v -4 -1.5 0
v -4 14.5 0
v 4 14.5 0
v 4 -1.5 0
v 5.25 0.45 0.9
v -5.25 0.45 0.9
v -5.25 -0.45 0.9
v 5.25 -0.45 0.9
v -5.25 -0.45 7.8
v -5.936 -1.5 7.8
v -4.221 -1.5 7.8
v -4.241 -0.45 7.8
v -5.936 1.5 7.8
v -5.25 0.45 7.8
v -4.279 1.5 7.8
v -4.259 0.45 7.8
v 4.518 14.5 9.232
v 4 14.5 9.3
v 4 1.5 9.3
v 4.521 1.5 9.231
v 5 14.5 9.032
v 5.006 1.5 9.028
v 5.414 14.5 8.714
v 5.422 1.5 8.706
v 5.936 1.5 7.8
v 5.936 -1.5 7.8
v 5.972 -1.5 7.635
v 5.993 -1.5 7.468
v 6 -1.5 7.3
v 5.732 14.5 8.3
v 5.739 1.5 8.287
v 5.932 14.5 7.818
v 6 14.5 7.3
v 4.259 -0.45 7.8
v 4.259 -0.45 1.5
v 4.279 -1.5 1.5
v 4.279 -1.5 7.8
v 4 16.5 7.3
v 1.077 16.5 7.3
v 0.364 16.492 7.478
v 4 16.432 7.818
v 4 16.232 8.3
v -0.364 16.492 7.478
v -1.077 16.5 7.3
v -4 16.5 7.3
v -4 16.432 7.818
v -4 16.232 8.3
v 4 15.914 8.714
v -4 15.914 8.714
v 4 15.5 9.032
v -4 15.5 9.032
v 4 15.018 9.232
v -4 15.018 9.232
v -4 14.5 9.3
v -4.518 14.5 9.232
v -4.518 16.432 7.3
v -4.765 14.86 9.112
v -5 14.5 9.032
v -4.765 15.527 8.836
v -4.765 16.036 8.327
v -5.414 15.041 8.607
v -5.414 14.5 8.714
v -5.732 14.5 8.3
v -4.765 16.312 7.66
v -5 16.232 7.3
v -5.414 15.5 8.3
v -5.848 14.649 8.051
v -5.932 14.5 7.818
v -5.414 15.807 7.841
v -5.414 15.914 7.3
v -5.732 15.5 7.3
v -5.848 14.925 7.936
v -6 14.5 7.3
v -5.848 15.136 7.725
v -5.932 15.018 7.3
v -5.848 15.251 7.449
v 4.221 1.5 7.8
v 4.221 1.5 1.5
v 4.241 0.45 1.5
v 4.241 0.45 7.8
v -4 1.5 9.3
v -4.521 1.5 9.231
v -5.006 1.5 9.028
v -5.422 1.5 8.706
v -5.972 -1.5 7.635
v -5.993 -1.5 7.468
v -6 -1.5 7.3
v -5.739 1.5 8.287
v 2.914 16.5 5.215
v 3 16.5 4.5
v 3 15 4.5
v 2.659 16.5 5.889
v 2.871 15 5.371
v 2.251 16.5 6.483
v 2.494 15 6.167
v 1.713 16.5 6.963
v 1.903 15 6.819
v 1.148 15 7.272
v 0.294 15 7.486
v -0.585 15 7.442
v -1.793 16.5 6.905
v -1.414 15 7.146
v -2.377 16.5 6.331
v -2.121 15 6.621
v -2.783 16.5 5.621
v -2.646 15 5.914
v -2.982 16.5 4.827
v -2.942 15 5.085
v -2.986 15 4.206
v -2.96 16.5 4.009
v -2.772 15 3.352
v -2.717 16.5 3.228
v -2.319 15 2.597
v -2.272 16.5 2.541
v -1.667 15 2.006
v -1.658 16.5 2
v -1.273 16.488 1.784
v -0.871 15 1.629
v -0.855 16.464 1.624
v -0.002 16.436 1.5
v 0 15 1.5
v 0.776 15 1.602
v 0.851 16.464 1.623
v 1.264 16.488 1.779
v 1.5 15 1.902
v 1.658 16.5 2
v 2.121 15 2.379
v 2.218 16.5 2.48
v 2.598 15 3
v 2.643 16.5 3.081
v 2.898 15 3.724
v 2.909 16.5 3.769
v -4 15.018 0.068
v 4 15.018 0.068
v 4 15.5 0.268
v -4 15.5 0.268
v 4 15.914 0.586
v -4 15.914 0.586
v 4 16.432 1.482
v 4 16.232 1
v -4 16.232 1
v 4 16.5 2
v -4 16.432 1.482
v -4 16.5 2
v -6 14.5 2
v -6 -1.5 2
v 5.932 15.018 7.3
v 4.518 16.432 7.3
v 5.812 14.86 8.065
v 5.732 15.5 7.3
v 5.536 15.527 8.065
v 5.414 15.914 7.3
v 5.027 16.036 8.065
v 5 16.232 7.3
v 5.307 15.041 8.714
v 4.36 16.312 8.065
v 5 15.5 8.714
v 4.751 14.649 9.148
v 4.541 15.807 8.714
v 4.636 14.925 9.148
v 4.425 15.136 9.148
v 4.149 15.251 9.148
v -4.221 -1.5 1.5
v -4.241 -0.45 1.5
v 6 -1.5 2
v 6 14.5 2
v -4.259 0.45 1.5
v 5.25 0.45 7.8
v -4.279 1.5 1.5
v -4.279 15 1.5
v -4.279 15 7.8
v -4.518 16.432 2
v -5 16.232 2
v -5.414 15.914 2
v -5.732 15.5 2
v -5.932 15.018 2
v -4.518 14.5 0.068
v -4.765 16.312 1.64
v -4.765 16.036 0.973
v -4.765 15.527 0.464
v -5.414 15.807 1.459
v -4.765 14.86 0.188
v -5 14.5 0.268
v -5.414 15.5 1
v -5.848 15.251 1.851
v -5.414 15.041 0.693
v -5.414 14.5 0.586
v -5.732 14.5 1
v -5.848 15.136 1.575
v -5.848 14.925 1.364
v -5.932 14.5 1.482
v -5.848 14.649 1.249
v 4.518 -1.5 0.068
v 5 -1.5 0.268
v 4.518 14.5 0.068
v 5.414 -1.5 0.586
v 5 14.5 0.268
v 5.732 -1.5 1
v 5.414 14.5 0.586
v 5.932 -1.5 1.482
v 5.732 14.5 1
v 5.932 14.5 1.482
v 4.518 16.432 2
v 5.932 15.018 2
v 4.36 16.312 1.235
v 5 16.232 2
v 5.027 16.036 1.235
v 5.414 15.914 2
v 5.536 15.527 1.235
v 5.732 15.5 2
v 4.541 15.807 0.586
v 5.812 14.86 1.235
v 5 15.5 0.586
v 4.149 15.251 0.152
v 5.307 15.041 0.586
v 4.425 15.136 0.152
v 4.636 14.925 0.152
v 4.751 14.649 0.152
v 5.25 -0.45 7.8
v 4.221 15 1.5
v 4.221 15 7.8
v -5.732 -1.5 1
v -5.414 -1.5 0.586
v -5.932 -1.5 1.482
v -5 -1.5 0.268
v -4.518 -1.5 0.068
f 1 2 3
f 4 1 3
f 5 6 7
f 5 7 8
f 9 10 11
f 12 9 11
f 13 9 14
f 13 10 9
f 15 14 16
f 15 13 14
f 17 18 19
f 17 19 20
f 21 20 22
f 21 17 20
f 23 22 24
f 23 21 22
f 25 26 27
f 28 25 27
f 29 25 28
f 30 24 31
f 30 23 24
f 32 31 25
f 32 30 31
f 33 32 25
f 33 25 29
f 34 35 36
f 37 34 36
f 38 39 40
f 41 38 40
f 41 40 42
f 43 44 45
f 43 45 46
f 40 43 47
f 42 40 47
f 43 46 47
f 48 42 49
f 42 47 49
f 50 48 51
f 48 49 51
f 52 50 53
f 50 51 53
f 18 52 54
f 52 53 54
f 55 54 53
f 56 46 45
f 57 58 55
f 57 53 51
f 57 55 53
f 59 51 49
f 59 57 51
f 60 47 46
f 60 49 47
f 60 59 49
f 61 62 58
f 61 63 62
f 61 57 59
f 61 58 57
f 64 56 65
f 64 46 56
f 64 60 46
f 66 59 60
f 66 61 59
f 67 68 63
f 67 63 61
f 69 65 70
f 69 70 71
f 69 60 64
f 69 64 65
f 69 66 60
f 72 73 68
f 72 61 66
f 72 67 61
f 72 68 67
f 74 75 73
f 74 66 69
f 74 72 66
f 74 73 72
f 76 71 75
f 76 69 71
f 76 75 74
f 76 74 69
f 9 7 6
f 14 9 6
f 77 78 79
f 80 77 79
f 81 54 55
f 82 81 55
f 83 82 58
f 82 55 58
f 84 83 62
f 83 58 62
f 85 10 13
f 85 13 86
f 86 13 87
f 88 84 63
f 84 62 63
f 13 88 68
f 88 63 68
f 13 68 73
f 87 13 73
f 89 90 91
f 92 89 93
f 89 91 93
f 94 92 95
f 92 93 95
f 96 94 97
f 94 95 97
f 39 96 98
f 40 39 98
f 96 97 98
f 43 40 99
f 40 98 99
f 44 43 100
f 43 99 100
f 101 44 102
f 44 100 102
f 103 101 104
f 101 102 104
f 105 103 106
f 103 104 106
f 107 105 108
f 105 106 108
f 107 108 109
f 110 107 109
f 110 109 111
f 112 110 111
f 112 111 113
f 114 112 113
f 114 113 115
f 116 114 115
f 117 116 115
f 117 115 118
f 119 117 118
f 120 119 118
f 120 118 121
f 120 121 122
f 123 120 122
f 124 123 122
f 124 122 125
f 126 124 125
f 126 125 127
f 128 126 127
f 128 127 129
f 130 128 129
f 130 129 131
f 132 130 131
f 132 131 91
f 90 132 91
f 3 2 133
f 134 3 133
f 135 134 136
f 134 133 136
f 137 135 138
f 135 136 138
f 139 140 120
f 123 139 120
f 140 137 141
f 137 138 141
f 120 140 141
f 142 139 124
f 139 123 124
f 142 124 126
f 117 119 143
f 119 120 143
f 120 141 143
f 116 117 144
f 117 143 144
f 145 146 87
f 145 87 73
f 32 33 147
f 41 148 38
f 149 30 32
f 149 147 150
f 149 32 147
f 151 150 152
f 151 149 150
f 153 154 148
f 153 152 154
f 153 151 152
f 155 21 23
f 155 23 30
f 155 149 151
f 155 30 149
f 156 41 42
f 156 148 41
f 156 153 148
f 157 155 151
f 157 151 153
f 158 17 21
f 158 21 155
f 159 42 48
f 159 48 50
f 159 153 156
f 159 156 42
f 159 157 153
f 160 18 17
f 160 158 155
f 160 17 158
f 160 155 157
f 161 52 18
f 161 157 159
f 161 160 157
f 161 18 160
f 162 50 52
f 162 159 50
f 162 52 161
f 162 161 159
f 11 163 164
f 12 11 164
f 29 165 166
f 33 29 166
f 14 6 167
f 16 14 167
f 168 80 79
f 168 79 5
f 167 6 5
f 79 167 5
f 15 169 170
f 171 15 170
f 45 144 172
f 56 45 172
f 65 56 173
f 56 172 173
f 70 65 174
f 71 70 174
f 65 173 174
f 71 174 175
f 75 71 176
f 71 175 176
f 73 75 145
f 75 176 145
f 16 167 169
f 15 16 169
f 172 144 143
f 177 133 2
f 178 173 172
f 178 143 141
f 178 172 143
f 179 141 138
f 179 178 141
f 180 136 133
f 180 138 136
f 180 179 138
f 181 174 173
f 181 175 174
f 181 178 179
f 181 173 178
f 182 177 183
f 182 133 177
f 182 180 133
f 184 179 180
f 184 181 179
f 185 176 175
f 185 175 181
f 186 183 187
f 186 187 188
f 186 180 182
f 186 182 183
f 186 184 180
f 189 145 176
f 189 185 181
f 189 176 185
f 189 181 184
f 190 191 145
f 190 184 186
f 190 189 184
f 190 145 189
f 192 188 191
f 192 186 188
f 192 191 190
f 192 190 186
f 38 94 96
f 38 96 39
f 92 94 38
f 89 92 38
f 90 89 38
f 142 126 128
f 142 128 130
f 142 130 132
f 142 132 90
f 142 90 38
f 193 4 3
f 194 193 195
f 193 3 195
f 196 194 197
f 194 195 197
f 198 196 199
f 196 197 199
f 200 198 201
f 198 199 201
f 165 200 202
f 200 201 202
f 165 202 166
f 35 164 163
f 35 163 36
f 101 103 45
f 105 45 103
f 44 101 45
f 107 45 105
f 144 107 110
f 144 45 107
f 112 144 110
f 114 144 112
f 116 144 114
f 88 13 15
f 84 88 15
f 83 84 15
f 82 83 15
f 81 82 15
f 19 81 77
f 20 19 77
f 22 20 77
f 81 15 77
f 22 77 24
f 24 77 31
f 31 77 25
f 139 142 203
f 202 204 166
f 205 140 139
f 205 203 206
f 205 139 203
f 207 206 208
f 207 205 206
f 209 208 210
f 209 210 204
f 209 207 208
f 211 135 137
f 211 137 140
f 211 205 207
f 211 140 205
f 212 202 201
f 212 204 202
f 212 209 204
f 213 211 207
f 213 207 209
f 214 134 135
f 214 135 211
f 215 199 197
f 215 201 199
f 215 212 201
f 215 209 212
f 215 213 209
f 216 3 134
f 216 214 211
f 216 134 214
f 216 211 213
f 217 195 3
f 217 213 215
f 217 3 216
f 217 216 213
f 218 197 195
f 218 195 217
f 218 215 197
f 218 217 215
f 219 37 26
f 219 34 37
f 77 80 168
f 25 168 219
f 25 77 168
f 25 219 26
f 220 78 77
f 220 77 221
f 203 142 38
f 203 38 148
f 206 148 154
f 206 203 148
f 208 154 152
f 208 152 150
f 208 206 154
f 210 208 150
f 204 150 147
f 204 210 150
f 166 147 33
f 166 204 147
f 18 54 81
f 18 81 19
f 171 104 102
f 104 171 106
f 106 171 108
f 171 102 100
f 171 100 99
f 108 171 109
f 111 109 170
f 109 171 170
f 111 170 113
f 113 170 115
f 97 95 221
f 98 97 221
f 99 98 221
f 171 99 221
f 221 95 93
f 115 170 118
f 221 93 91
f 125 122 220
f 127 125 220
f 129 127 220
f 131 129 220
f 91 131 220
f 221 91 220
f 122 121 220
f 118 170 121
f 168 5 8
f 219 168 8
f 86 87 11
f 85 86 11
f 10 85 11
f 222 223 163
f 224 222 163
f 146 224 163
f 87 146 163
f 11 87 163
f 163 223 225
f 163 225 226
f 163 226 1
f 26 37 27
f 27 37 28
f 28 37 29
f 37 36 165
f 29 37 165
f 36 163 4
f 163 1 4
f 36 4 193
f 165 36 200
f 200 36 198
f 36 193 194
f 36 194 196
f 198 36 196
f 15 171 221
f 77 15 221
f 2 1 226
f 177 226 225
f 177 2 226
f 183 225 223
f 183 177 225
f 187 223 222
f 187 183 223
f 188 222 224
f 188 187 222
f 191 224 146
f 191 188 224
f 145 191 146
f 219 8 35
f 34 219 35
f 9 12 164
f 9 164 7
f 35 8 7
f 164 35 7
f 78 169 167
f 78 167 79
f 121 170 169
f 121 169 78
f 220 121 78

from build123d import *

# Parameters (mm, degrees)
F0_W         = 8.5
F0_H         = 13.5
F0_W_2       = 1.7211329822
F0_H_2       = 1.5
F0_W_3       = 1.7788670178
F1_DEPTH     = 0.9
F2_DEPTH     = 1.5
F3_DEPTH     = 7.8
F5_W         = 12
F5_H         = 15
F6_DEPTH     = 1.5
F7_R         = 3
F8_DEPTH     = 16.501
F9_T1_DEPTH  = 5.3
F9_T3_DEPTH  = 8
F9_T5_DEPTH  = 18
F9_T7_DEPTH  = 21
F9_S11_W     = 2
F9_S11_H     = 2
F9_T12_DEPTH = 2
F9_S17_W     = 2
F9_S17_H     = 2
F9_T18_DEPTH = 2
F9_S23_W     = 2
F9_S23_H     = 2
F9_T24_DEPTH = 2
F9_S29_W     = 2
F9_S29_H     = 2
F9_T30_DEPTH = 2


# Not quite as in the source:
# - a fillet or chamfer that OpenCascade refuses, or shapes differently, is made with other operations: its cross-section is extruded or revolved along the edge and cut away or added
# - a feature names something its author has since deleted; it is built from what else it names


with BuildPart() as f1:
    # F0 (on Top) → F1 (new body)
    with BuildSketch(Plane.XY):
        with Locations((-0.0288670178, 8.25)):
            Rectangle(F0_W, F0_H)
        Polygon((-6, 1.5), (-6, -1.5), (-4.2211329822, -1.5), (-4.2413398946, -0.45), (-5.25, -0.45), (-5.25, 0.45), (-4.2586601054, 0.45), (-4.2788670178, 1.5), align=None)
        Polygon((4.2211329822, 1.5), (-4.2788670178, 1.5), (-4.2586601054, 0.45), (4.2413398946, 0.45), align=None)
        with Locations((-5.1394335089, 8.25)):
            Rectangle(F0_W_2, F0_H)
        Polygon((4.2586601054, -0.45), (4.2788670178, -1.5), (6, -1.5), (6, 1.5), (4.2211329822, 1.5), (4.2413398946, 0.45), (5.25, 0.45), (5.25, -0.45), align=None)
        Polygon((-4.2413398946, -0.45), (-4.2211329822, -1.5), (4.2788670178, -1.5), (4.2586601054, -0.45), align=None)
        Polygon((-4.2586601054, 0.45), (-4.2413398946, -0.45), (4.2586601054, -0.45), (4.2413398946, 0.45), align=None)
        Polygon((-5.25, -0.45), (-4.2413398946, -0.45), (-4.2586601054, 0.45), (-5.25, 0.45), align=None)
        Polygon((4.2413398946, 0.45), (4.2586601054, -0.45), (5.25, -0.45), (5.25, 0.45), align=None)
        with Locations((-5.1394335089, 15.75)):
            Rectangle(F0_W_2, F0_H_2)
        with Locations((-0.0288670178, 15.75)):
            Rectangle(F0_W, F0_H_2)
        with Locations((5.1105664911, 15.75)):
            Rectangle(F0_W_3, F0_H_2)
        with Locations((5.1105664911, 8.25)):
            Rectangle(F0_W_3, F0_H)
    extrude(amount=F1_DEPTH)

    # F0 (on Top) → F2 (join)
    with BuildSketch(Plane.XY):
        Polygon((-4.2413398946, -0.45), (-4.2211329822, -1.5), (4.2788670178, -1.5), (4.2586601054, -0.45), align=None)
        Polygon((-6, 1.5), (-6, -1.5), (-4.2211329822, -1.5), (-4.2413398946, -0.45), (-5.25, -0.45), (-5.25, 0.45), (-4.2586601054, 0.45), (-4.2788670178, 1.5), align=None)
        Polygon((4.2586601054, -0.45), (4.2788670178, -1.5), (6, -1.5), (6, 1.5), (4.2211329822, 1.5), (4.2413398946, 0.45), (5.25, 0.45), (5.25, -0.45), align=None)
        Polygon((4.2211329822, 1.5), (-4.2788670178, 1.5), (-4.2586601054, 0.45), (4.2413398946, 0.45), align=None)
        with Locations((-5.1394335089, 8.25)):
            Rectangle(F0_W_2, F0_H)
        with Locations((5.1105664911, 8.25)):
            Rectangle(F0_W_3, F0_H)
        with Locations((-0.0288670178, 8.25)):
            Rectangle(F0_W, F0_H)
        with Locations((-5.1394335089, 15.75)):
            Rectangle(F0_W_2, F0_H_2)
        with Locations((-0.0288670178, 15.75)):
            Rectangle(F0_W, F0_H_2)
        with Locations((5.1105664911, 15.75)):
            Rectangle(F0_W_3, F0_H_2)
    extrude(amount=F2_DEPTH)

    # F0 (on Top) → F3 (join)
    with BuildSketch(Plane.XY):
        Polygon((-6, 1.5), (-6, -1.5), (-4.2211329822, -1.5), (-4.2413398946, -0.45), (-5.25, -0.45), (-5.25, 0.45), (-4.2586601054, 0.45), (-4.2788670178, 1.5), align=None)
        Polygon((4.2586601054, -0.45), (4.2788670178, -1.5), (6, -1.5), (6, 1.5), (4.2211329822, 1.5), (4.2413398946, 0.45), (5.25, 0.45), (5.25, -0.45), align=None)
        with Locations((-5.1394335089, 8.25)):
            Rectangle(F0_W_2, F0_H)
        with Locations((5.1105664911, 8.25)):
            Rectangle(F0_W_3, F0_H)
        with Locations((-5.1394335089, 15.75)):
            Rectangle(F0_W_2, F0_H_2)
        with Locations((-0.0288670178, 15.75)):
            Rectangle(F0_W, F0_H_2)
        with Locations((5.1105664911, 15.75)):
            Rectangle(F0_W_3, F0_H_2)
    extrude(amount=F3_DEPTH)

    # F5 (on offset) → F6 (join)
    with BuildSketch(Plane.XY.offset(7.8)):
        with Locations((0, 9)):
            Rectangle(F5_W, F5_H)
    extrude(amount=F6_DEPTH)

    # F7 (on Front) → F8 (cut, through all)
    with BuildSketch(Plane.XZ):
        with Locations((0, 4.5)):
            Circle(F7_R)
    extrude(amount=-F8_DEPTH, mode=Mode.SUBTRACT)

    # F9: fillet of radius 2 on 8 edges, made by hand

    # F9_s2 → F9_t1 (cut)
    with BuildSketch(Plane.XY.offset(2)):
        with BuildLine():
            ThreePointArc((4, 16.5), (5.4142135624, 15.9142135624), (6, 14.5))
            Line((6, 14.5), (6, 16.5))
            Line((6, 16.5), (4, 16.5))
        make_face()
        with BuildLine():
            ThreePointArc((-4, 16.5), (-5.4142135624, 15.9142135624), (-6, 14.5))
            Line((-6, 14.5), (-6, 16.5))
            Line((-6, 16.5), (-4, 16.5))
        make_face()
    extrude(amount=F9_T1_DEPTH, mode=Mode.SUBTRACT)

    # F9_s4 → F9_t3 (cut)
    with BuildSketch(Plane.YZ.offset(-4)):
        with BuildLine():
            ThreePointArc((16.5, 7.3), (15.9142135624, 8.7142135624), (14.5, 9.3))
            Line((14.5, 9.3), (16.5, 9.3))
            Line((16.5, 9.3), (16.5, 7.3))
        make_face()
        with BuildLine():
            ThreePointArc((14.5, 0), (15.9142135624, 0.5857864376), (16.5, 2))
            Line((16.5, 2), (16.5, 0))
            Line((16.5, 0), (14.5, 0))
        make_face()
    extrude(amount=F9_T3_DEPTH, mode=Mode.SUBTRACT)

    # F9_s6 → F9_t5 (cut)
    with BuildSketch(Plane.XZ.offset(-14.5)):
        with BuildLine():
            ThreePointArc((4, 9.3), (5.4142135624, 8.7142135624), (6, 7.3))
            Line((6, 7.3), (6, 9.3))
            Line((6, 9.3), (4, 9.3))
        make_face()
        with BuildLine():
            ThreePointArc((-4, 9.3), (-5.4142135624, 8.7142135624), (-6, 7.3))
            Line((-6, 7.3), (-6, 9.3))
            Line((-6, 9.3), (-4, 9.3))
        make_face()
    extrude(amount=F9_T5_DEPTH, mode=Mode.SUBTRACT)

    # F9_s8 → F9_t7 (cut)
    with BuildSketch(Plane.XZ.offset(-14.5)):
        with BuildLine():
            ThreePointArc((4, 0), (5.4142135624, 0.5857864376), (6, 2))
            Line((6, 2), (6, 0))
            Line((6, 0), (4, 0))
        make_face()
        with BuildLine():
            ThreePointArc((-4, 0), (-5.4142135624, 0.5857864376), (-6, 2))
            Line((-6, 2), (-6, 0))
            Line((-6, 0), (-4, 0))
        make_face()
    extrude(amount=F9_T7_DEPTH, mode=Mode.SUBTRACT)


with BuildPart() as f9_tool10:
    # F9_s11 → F9_t12 (new body)
    with BuildSketch(Plane.XY.offset(2)):
        with Locations((5, 15.5)):
            Rectangle(F9_S11_W, F9_S11_H)
    extrude(amount=-F9_T12_DEPTH)

    # F9_s13 → F9_t14 (revolve, cut)
    with BuildSketch(Plane(origin=(4, 14.5, 2), x_dir=(-0.7071067812, -0.7071067812, 0), z_dir=(0.7071067812, -0.7071067812, 0))):
        with BuildLine():
            ThreePointArc((0, -2), (2, 0), (0, 2))
            Line((0, 2), (0, -2))
        make_face()
    revolve(axis=Axis((4, 14.5, 2), (0, 0, -1)), mode=Mode.SUBTRACT)


with BuildPart() as f1_1:
    add(f1.part)

    # F9_t9: cut F9_tool10
    add(f9_tool10.part, mode=Mode.SUBTRACT)


with BuildPart() as f9_tool16:
    # F9_s17 → F9_t18 (new body)
    with BuildSketch(Plane.XY.offset(7.3)):
        with Locations((5, 15.5)):
            Rectangle(F9_S17_W, F9_S17_H)
    extrude(amount=F9_T18_DEPTH)

    # F9_s19 → F9_t20 (revolve, cut)
    with BuildSketch(Plane(origin=(4, 14.5, 7.3), x_dir=(-0.7071067812, -0.7071067812, 0), z_dir=(-0.7071067812, 0.7071067812, 0))):
        with BuildLine():
            ThreePointArc((0, -2), (2, 0), (0, 2))
            Line((0, 2), (0, -2))
        make_face()
    revolve(axis=Axis((4, 14.5, 7.3), (0, 0, 1)), mode=Mode.SUBTRACT)


with BuildPart() as f1_2:
    add(f1_1.part)

    # F9_t15: cut F9_tool16
    add(f9_tool16.part, mode=Mode.SUBTRACT)


with BuildPart() as f9_tool22:
    # F9_s23 → F9_t24 (new body)
    with BuildSketch(Plane.YZ.offset(-4)):
        with Locations((15.5, 8.3)):
            Rectangle(F9_S23_W, F9_S23_H)
    extrude(amount=-F9_T24_DEPTH)

    # F9_s25 → F9_t26 (revolve, cut)
    with BuildSketch(Plane(origin=(-4, 14.5, 7.3), x_dir=(0, -0.7071067812, -0.7071067812), z_dir=(0, 0.7071067812, -0.7071067812))):
        with BuildLine():
            ThreePointArc((0, -2), (2, 0), (0, 2))
            Line((0, 2), (0, -2))
        make_face()
    revolve(axis=Axis((-4, 14.5, 7.3), (-1, 0, 0)), mode=Mode.SUBTRACT)


with BuildPart() as f1_3:
    add(f1_2.part)

    # F9_t21: cut F9_tool22
    add(f9_tool22.part, mode=Mode.SUBTRACT)


with BuildPart() as f9_tool28:
    # F9_s29 → F9_t30 (new body)
    with BuildSketch(Plane.YZ.offset(-4)):
        with Locations((15.5, 1)):
            Rectangle(F9_S29_W, F9_S29_H)
    extrude(amount=-F9_T30_DEPTH)

    # F9_s31 → F9_t32 (revolve, cut)
    with BuildSketch(Plane(origin=(-4, 14.5, 2), x_dir=(0, -0.7071067812, 0.7071067812), z_dir=(0, -0.7071067812, -0.7071067812))):
        with BuildLine():
            ThreePointArc((0, -2), (2, 0), (0, 2))
            Line((0, 2), (0, -2))
        make_face()
    revolve(axis=Axis((-4, 14.5, 2), (-1, 0, 0)), mode=Mode.SUBTRACT)


with BuildPart() as f1_4:
    add(f1_3.part)

    # F9_t27: cut F9_tool28
    add(f9_tool28.part, mode=Mode.SUBTRACT)


solid = f1_4.part
